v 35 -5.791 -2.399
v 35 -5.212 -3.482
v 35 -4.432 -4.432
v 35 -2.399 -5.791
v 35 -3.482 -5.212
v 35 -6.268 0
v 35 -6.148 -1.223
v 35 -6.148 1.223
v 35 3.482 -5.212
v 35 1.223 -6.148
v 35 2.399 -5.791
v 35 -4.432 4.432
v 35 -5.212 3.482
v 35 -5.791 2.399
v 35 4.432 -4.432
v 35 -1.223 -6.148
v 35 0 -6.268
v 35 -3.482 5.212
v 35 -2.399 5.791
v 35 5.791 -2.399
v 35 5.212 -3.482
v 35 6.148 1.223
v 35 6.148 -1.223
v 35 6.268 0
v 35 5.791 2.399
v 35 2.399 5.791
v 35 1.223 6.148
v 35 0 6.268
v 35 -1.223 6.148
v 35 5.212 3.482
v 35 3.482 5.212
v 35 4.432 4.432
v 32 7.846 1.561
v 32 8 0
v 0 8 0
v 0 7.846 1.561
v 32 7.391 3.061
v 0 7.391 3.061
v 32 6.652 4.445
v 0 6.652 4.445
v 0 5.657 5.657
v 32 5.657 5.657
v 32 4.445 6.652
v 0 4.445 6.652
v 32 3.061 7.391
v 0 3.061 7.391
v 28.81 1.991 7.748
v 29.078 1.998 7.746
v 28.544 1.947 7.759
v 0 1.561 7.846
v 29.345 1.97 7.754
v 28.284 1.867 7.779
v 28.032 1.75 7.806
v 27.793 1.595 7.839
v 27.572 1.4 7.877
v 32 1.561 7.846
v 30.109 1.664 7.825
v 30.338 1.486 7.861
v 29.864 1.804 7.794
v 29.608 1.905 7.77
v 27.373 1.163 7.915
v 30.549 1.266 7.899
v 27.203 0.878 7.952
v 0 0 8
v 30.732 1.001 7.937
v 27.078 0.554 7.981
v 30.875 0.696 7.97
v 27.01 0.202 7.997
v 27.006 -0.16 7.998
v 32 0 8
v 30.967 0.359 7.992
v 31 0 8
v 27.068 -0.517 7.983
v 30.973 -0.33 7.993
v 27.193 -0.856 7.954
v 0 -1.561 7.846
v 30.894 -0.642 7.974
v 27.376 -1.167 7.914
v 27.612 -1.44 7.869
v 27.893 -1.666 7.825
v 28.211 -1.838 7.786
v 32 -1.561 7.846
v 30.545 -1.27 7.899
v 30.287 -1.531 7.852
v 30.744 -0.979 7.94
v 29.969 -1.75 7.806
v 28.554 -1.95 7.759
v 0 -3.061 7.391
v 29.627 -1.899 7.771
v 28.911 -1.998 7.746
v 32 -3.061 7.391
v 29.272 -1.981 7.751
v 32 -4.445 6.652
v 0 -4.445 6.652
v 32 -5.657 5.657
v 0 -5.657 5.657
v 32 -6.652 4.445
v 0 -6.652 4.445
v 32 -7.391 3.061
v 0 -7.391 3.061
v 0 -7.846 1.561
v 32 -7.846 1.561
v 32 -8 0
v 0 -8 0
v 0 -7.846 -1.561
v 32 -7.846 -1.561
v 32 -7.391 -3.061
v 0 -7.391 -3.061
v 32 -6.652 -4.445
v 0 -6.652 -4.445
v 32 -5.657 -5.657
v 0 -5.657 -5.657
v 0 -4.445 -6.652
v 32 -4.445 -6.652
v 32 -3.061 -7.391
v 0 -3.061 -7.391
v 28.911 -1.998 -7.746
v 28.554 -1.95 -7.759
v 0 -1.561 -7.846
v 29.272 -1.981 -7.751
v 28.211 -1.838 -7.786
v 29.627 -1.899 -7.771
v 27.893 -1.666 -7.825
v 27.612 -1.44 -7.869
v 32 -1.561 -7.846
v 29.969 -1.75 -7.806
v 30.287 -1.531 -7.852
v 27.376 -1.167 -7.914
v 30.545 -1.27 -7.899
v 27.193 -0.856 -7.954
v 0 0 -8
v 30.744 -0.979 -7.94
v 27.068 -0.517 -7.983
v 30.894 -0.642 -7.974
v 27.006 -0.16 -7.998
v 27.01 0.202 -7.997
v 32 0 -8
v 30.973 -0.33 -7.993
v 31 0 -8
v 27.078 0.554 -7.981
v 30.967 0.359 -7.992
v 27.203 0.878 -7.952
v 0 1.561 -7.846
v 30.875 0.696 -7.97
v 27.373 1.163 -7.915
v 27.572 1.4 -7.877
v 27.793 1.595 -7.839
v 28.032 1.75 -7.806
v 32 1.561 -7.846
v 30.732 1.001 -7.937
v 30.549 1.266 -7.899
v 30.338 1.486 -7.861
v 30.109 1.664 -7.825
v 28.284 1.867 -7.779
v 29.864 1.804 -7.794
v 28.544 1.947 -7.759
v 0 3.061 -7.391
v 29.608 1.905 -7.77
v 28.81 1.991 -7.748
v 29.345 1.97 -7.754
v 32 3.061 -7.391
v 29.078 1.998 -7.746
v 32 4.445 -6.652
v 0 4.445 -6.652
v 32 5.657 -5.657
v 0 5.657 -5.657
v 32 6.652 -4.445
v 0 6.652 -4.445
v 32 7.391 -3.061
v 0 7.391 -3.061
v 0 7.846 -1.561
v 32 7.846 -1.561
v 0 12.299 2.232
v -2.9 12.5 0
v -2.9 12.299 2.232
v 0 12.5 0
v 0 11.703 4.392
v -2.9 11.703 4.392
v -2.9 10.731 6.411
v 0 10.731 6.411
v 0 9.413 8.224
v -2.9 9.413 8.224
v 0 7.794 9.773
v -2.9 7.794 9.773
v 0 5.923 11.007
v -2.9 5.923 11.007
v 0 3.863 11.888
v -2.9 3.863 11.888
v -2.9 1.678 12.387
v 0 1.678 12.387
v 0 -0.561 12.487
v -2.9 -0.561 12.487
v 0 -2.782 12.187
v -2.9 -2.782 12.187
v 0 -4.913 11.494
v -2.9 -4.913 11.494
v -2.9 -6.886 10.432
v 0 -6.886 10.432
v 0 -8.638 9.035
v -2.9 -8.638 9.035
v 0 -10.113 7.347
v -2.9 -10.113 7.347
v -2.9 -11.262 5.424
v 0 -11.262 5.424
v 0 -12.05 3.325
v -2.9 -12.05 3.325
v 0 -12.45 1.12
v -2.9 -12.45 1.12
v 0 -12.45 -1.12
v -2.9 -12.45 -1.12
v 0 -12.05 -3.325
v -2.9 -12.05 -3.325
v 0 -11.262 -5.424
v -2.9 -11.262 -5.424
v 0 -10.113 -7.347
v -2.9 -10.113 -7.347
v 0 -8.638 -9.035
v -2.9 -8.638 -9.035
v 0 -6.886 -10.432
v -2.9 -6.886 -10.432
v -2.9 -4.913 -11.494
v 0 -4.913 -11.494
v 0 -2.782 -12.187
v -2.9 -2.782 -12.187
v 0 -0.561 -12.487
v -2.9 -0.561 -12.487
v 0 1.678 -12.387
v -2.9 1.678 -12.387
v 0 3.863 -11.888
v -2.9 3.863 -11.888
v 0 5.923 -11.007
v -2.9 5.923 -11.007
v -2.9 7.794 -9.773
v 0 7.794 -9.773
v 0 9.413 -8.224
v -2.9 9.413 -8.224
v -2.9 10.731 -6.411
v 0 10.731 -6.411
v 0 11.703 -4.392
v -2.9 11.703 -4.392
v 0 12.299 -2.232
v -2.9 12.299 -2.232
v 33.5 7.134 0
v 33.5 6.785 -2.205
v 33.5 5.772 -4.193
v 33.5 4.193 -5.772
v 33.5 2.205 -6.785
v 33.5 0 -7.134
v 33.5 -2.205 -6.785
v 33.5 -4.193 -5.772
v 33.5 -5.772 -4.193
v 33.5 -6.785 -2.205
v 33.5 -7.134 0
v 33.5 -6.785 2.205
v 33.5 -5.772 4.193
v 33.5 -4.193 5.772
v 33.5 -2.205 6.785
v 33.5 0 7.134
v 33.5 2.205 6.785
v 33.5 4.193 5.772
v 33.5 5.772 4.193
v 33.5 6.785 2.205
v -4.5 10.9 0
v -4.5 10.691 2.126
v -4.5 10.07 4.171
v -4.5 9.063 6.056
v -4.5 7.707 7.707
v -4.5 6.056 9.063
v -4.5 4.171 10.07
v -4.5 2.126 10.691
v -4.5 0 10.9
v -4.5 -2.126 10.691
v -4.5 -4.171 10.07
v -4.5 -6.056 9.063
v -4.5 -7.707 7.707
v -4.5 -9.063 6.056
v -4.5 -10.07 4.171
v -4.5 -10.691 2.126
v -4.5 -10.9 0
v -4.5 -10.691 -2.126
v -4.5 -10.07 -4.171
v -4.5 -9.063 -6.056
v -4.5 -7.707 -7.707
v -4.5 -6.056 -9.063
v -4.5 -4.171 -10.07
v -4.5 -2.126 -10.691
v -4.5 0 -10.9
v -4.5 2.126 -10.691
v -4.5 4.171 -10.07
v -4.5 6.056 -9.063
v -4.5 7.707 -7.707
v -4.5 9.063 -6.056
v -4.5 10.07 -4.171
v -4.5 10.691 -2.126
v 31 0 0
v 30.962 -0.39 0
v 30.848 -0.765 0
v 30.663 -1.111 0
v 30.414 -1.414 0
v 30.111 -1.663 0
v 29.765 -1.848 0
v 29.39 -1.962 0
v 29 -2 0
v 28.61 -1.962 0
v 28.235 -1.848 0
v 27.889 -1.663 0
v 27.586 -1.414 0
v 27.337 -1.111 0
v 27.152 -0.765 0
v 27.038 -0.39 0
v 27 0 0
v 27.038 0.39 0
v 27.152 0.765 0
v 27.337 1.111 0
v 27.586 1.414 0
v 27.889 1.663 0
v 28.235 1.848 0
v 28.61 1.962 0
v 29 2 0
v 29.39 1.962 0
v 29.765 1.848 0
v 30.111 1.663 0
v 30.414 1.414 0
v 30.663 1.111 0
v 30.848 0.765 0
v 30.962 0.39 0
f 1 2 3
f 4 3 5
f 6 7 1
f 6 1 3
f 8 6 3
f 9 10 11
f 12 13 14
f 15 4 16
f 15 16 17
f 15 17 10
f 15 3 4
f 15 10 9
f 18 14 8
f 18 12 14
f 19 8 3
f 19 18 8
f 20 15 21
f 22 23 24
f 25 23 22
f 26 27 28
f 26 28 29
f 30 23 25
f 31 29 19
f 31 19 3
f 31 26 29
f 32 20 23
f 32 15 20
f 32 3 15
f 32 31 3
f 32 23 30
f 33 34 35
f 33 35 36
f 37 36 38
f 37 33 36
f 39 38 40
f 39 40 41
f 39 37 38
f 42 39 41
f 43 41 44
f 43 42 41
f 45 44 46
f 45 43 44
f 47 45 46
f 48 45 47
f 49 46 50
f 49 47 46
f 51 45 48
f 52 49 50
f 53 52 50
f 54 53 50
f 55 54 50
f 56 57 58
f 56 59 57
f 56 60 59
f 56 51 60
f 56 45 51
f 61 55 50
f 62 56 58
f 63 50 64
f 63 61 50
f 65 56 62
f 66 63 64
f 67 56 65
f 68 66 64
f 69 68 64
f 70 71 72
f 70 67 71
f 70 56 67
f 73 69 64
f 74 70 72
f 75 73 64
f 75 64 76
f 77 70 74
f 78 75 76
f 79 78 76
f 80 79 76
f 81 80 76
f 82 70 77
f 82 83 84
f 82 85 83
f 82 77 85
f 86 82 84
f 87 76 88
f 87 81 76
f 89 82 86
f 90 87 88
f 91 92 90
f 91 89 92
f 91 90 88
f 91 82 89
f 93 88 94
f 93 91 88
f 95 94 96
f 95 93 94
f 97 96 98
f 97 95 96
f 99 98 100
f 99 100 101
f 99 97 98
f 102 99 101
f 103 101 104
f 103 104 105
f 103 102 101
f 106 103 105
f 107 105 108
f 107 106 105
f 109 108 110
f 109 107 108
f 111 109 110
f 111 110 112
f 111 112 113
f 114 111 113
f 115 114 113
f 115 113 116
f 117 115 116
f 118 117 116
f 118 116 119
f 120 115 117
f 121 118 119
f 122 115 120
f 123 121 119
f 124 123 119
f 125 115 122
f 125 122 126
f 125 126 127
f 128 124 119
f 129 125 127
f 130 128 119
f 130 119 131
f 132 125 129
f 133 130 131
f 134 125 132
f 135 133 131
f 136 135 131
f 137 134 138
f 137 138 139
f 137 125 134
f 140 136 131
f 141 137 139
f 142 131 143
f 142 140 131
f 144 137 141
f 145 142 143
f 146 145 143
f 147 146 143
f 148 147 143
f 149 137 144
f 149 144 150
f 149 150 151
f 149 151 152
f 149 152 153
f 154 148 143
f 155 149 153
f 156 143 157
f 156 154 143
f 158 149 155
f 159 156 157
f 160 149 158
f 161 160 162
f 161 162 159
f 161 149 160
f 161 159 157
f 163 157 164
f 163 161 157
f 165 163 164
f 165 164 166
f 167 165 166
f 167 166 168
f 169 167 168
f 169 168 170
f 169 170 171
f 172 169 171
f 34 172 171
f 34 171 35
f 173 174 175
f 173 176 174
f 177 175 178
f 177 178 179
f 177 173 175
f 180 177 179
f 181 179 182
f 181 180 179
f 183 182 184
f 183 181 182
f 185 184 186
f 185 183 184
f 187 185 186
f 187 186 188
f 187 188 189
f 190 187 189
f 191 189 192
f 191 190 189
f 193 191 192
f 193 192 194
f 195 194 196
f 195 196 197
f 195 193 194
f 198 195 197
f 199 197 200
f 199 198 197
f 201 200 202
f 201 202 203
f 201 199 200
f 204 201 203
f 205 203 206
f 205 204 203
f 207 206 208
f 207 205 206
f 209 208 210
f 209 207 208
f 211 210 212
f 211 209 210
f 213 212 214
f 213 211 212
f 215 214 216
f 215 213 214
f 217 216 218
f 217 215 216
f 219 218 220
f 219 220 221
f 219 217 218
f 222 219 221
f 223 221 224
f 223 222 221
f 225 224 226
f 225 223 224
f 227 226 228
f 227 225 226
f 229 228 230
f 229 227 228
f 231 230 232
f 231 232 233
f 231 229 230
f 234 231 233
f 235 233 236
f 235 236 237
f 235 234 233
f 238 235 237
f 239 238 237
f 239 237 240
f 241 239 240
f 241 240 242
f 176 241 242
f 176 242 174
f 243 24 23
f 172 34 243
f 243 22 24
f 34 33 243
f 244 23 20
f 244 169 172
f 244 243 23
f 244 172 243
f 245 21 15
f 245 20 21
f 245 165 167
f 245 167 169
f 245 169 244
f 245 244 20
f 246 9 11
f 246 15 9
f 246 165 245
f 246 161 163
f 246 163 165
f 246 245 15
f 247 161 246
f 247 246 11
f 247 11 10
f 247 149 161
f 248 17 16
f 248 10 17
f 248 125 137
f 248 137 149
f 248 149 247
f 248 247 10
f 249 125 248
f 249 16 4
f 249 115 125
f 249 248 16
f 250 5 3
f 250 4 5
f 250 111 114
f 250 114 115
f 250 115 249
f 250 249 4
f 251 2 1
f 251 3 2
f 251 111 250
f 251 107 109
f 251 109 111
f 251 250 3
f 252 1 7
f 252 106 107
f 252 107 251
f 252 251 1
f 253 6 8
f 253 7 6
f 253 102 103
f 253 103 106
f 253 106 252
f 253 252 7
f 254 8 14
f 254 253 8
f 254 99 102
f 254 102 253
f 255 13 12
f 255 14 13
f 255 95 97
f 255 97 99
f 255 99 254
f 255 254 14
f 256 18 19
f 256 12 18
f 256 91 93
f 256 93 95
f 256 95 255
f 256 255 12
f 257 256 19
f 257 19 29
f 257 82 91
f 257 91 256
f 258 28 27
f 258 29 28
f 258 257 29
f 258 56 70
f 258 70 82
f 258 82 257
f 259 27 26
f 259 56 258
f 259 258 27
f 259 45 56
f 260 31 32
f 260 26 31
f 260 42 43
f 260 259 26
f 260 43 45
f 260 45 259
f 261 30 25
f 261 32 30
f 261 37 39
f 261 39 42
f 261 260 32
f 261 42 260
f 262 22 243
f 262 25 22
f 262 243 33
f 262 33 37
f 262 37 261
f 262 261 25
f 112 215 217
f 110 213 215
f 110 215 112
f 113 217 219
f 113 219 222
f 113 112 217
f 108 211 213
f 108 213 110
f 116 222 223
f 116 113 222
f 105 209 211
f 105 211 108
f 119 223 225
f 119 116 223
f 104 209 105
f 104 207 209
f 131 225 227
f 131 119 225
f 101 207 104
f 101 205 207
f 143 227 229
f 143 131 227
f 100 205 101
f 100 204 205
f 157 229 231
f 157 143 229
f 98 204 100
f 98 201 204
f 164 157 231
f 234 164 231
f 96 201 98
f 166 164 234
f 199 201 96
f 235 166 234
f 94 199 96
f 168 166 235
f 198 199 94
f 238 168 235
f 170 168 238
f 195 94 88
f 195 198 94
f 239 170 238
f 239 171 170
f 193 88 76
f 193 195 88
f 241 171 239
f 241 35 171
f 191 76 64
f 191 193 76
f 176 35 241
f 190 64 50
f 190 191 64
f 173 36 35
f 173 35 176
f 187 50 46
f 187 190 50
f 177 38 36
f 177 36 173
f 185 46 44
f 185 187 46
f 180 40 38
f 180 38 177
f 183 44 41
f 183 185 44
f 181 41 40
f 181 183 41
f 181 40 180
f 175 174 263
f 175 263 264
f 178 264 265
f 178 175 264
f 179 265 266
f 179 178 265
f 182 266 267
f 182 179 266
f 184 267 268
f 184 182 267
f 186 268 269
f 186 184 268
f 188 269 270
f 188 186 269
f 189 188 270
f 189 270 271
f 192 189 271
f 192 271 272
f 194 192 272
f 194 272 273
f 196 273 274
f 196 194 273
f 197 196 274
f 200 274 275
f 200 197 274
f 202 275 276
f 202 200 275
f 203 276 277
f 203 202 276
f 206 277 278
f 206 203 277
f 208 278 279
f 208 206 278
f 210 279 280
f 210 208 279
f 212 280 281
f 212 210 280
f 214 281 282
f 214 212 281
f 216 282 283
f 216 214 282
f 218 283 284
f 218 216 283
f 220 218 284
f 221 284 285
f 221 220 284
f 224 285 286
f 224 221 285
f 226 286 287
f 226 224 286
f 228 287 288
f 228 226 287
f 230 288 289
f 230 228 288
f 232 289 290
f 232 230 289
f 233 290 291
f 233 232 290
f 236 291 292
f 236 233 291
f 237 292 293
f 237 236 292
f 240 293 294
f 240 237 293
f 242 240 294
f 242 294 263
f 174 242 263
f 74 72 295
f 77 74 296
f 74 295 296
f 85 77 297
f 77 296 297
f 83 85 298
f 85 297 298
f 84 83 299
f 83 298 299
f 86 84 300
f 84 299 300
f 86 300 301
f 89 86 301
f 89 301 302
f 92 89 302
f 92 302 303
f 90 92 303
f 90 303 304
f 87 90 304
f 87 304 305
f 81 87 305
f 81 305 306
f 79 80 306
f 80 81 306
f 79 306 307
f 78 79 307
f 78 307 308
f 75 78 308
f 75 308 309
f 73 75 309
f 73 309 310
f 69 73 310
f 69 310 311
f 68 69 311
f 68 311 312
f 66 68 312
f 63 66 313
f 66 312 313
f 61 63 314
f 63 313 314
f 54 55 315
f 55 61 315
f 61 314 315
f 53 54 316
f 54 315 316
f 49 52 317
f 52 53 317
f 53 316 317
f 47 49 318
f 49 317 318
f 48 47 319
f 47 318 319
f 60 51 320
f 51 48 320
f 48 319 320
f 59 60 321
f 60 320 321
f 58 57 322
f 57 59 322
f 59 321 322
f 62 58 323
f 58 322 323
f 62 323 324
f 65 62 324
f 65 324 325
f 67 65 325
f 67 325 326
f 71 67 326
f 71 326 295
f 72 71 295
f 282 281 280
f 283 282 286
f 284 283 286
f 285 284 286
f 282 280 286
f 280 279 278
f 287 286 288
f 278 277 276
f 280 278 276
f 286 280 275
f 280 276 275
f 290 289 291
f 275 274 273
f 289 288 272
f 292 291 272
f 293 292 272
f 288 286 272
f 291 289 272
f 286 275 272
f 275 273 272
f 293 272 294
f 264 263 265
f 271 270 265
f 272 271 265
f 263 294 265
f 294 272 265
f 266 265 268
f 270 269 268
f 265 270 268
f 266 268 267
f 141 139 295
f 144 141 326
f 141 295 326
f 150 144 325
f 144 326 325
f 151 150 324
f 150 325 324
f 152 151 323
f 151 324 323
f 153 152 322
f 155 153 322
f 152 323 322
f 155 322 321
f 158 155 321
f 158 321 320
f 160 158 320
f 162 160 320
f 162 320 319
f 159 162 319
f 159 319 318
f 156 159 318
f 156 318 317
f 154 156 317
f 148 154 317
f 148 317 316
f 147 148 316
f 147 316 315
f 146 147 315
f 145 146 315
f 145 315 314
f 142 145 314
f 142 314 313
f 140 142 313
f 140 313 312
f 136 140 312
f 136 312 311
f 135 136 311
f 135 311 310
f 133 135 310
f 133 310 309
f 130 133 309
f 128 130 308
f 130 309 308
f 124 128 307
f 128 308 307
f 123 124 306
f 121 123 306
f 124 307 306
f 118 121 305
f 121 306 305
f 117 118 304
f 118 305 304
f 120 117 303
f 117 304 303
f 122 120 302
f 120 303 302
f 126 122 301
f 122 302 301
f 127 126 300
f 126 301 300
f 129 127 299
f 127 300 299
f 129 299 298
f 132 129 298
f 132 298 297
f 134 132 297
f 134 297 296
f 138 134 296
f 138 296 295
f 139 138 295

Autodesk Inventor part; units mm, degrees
ref_plane "YZ Plane" through (0, 0, 0) normal (1, 0, 0) x (0, 1, 0)
ref_plane "XZ Plane" through (0, 0, 0) normal (0, 1, 0) x (-1, 0, 0)
sketch "Sketch1" plane through (0, 0, 0) normal (0, 0, 1) x (1, 0, 0)
  line L0 (-4.5, 0) -> (-4.5, 12.5)
  line L1 (-4.5, 12.5) -> (0, 12.5)
  line L2 (0, 12.5) -> (0, 8)
  line L3 (0, 8) -> (35, 8)
  line L4 (35, 8) -> (35, 0)
  line L5 (-4.5, 0) -> (35, 0)
  line L6 (-4, 0) -> (17, 0) projected
  line L7 (0, -0.98) -> (0, 3.08) projected
  circle A0 centre (29, 0) radius 2
  dimension "d0" = 16
  dimension "d1" = 25
  dimension "d2" = 4.5
  dimension "d3" = 35
  dimension "d5" = 6
  dimension "d6" = 4
revolve "Body" add sketch "Sketch1" angle 360 about axis through (-4.5, 0, 0) along (1, 0, 0) picked at (28.3903, 0.4694) contours L0 L1 L2 L3 L4 L5 A0 | A0 L5
extrude "Hole" cut sketch "Sketch1" along normal through all both and the other way through all contours A0 L5 | L5 A0
chamfer "Chamfer1" distance 1.6 angle 45 1 edges at (-4.5, -12.5, 0) measured on face at (-3, 12.4595, -1.0058)
chamfer "Chamfer2" distance 3 angle 30 1 edges at (35, -8, 0) measured on face at (11.6667, 7.9741, -0.6437)
ref_plane "Work Plane1" through (17.5, 0, 8) normal (0, 0, 1) x (1, 0, 0)
equation "\"d0\" = NND"
equation "\"d1\" = KOD"
equation "\"d2\" = KOH"
equation "\"d3\" = NLG"
equation "\"d5\" = DIST"
equation "\"d6\" = BOR"
equation "\"d7\" = NND"
equation "\"d9\" = PHH2"
equation "\"d10\" = FAWI2"
equation "\"d16\" = PHH2"
equation "\"d11\" = PHH1"
equation "\"d12\" = FAWI1"
equation "\"d17\" = PHH1"
equation "\"PHH1\" = 3"
equation "\"PHH2\" = 1.6"
equation "\"KOD\" = 25"
equation "\"KOH\" = 4.5"
equation "\"NND\" = 16"
equation "\"FAWI1\" = 30deg"
equation "\"FAWI2\" = 45deg"
equation "\"DIST\" = 6"
equation "\"BOR\" = 4"
equation "\"NLG\" = 35"
properties part number "ISO 2341 - B - 16 x 35" material "Steel"
